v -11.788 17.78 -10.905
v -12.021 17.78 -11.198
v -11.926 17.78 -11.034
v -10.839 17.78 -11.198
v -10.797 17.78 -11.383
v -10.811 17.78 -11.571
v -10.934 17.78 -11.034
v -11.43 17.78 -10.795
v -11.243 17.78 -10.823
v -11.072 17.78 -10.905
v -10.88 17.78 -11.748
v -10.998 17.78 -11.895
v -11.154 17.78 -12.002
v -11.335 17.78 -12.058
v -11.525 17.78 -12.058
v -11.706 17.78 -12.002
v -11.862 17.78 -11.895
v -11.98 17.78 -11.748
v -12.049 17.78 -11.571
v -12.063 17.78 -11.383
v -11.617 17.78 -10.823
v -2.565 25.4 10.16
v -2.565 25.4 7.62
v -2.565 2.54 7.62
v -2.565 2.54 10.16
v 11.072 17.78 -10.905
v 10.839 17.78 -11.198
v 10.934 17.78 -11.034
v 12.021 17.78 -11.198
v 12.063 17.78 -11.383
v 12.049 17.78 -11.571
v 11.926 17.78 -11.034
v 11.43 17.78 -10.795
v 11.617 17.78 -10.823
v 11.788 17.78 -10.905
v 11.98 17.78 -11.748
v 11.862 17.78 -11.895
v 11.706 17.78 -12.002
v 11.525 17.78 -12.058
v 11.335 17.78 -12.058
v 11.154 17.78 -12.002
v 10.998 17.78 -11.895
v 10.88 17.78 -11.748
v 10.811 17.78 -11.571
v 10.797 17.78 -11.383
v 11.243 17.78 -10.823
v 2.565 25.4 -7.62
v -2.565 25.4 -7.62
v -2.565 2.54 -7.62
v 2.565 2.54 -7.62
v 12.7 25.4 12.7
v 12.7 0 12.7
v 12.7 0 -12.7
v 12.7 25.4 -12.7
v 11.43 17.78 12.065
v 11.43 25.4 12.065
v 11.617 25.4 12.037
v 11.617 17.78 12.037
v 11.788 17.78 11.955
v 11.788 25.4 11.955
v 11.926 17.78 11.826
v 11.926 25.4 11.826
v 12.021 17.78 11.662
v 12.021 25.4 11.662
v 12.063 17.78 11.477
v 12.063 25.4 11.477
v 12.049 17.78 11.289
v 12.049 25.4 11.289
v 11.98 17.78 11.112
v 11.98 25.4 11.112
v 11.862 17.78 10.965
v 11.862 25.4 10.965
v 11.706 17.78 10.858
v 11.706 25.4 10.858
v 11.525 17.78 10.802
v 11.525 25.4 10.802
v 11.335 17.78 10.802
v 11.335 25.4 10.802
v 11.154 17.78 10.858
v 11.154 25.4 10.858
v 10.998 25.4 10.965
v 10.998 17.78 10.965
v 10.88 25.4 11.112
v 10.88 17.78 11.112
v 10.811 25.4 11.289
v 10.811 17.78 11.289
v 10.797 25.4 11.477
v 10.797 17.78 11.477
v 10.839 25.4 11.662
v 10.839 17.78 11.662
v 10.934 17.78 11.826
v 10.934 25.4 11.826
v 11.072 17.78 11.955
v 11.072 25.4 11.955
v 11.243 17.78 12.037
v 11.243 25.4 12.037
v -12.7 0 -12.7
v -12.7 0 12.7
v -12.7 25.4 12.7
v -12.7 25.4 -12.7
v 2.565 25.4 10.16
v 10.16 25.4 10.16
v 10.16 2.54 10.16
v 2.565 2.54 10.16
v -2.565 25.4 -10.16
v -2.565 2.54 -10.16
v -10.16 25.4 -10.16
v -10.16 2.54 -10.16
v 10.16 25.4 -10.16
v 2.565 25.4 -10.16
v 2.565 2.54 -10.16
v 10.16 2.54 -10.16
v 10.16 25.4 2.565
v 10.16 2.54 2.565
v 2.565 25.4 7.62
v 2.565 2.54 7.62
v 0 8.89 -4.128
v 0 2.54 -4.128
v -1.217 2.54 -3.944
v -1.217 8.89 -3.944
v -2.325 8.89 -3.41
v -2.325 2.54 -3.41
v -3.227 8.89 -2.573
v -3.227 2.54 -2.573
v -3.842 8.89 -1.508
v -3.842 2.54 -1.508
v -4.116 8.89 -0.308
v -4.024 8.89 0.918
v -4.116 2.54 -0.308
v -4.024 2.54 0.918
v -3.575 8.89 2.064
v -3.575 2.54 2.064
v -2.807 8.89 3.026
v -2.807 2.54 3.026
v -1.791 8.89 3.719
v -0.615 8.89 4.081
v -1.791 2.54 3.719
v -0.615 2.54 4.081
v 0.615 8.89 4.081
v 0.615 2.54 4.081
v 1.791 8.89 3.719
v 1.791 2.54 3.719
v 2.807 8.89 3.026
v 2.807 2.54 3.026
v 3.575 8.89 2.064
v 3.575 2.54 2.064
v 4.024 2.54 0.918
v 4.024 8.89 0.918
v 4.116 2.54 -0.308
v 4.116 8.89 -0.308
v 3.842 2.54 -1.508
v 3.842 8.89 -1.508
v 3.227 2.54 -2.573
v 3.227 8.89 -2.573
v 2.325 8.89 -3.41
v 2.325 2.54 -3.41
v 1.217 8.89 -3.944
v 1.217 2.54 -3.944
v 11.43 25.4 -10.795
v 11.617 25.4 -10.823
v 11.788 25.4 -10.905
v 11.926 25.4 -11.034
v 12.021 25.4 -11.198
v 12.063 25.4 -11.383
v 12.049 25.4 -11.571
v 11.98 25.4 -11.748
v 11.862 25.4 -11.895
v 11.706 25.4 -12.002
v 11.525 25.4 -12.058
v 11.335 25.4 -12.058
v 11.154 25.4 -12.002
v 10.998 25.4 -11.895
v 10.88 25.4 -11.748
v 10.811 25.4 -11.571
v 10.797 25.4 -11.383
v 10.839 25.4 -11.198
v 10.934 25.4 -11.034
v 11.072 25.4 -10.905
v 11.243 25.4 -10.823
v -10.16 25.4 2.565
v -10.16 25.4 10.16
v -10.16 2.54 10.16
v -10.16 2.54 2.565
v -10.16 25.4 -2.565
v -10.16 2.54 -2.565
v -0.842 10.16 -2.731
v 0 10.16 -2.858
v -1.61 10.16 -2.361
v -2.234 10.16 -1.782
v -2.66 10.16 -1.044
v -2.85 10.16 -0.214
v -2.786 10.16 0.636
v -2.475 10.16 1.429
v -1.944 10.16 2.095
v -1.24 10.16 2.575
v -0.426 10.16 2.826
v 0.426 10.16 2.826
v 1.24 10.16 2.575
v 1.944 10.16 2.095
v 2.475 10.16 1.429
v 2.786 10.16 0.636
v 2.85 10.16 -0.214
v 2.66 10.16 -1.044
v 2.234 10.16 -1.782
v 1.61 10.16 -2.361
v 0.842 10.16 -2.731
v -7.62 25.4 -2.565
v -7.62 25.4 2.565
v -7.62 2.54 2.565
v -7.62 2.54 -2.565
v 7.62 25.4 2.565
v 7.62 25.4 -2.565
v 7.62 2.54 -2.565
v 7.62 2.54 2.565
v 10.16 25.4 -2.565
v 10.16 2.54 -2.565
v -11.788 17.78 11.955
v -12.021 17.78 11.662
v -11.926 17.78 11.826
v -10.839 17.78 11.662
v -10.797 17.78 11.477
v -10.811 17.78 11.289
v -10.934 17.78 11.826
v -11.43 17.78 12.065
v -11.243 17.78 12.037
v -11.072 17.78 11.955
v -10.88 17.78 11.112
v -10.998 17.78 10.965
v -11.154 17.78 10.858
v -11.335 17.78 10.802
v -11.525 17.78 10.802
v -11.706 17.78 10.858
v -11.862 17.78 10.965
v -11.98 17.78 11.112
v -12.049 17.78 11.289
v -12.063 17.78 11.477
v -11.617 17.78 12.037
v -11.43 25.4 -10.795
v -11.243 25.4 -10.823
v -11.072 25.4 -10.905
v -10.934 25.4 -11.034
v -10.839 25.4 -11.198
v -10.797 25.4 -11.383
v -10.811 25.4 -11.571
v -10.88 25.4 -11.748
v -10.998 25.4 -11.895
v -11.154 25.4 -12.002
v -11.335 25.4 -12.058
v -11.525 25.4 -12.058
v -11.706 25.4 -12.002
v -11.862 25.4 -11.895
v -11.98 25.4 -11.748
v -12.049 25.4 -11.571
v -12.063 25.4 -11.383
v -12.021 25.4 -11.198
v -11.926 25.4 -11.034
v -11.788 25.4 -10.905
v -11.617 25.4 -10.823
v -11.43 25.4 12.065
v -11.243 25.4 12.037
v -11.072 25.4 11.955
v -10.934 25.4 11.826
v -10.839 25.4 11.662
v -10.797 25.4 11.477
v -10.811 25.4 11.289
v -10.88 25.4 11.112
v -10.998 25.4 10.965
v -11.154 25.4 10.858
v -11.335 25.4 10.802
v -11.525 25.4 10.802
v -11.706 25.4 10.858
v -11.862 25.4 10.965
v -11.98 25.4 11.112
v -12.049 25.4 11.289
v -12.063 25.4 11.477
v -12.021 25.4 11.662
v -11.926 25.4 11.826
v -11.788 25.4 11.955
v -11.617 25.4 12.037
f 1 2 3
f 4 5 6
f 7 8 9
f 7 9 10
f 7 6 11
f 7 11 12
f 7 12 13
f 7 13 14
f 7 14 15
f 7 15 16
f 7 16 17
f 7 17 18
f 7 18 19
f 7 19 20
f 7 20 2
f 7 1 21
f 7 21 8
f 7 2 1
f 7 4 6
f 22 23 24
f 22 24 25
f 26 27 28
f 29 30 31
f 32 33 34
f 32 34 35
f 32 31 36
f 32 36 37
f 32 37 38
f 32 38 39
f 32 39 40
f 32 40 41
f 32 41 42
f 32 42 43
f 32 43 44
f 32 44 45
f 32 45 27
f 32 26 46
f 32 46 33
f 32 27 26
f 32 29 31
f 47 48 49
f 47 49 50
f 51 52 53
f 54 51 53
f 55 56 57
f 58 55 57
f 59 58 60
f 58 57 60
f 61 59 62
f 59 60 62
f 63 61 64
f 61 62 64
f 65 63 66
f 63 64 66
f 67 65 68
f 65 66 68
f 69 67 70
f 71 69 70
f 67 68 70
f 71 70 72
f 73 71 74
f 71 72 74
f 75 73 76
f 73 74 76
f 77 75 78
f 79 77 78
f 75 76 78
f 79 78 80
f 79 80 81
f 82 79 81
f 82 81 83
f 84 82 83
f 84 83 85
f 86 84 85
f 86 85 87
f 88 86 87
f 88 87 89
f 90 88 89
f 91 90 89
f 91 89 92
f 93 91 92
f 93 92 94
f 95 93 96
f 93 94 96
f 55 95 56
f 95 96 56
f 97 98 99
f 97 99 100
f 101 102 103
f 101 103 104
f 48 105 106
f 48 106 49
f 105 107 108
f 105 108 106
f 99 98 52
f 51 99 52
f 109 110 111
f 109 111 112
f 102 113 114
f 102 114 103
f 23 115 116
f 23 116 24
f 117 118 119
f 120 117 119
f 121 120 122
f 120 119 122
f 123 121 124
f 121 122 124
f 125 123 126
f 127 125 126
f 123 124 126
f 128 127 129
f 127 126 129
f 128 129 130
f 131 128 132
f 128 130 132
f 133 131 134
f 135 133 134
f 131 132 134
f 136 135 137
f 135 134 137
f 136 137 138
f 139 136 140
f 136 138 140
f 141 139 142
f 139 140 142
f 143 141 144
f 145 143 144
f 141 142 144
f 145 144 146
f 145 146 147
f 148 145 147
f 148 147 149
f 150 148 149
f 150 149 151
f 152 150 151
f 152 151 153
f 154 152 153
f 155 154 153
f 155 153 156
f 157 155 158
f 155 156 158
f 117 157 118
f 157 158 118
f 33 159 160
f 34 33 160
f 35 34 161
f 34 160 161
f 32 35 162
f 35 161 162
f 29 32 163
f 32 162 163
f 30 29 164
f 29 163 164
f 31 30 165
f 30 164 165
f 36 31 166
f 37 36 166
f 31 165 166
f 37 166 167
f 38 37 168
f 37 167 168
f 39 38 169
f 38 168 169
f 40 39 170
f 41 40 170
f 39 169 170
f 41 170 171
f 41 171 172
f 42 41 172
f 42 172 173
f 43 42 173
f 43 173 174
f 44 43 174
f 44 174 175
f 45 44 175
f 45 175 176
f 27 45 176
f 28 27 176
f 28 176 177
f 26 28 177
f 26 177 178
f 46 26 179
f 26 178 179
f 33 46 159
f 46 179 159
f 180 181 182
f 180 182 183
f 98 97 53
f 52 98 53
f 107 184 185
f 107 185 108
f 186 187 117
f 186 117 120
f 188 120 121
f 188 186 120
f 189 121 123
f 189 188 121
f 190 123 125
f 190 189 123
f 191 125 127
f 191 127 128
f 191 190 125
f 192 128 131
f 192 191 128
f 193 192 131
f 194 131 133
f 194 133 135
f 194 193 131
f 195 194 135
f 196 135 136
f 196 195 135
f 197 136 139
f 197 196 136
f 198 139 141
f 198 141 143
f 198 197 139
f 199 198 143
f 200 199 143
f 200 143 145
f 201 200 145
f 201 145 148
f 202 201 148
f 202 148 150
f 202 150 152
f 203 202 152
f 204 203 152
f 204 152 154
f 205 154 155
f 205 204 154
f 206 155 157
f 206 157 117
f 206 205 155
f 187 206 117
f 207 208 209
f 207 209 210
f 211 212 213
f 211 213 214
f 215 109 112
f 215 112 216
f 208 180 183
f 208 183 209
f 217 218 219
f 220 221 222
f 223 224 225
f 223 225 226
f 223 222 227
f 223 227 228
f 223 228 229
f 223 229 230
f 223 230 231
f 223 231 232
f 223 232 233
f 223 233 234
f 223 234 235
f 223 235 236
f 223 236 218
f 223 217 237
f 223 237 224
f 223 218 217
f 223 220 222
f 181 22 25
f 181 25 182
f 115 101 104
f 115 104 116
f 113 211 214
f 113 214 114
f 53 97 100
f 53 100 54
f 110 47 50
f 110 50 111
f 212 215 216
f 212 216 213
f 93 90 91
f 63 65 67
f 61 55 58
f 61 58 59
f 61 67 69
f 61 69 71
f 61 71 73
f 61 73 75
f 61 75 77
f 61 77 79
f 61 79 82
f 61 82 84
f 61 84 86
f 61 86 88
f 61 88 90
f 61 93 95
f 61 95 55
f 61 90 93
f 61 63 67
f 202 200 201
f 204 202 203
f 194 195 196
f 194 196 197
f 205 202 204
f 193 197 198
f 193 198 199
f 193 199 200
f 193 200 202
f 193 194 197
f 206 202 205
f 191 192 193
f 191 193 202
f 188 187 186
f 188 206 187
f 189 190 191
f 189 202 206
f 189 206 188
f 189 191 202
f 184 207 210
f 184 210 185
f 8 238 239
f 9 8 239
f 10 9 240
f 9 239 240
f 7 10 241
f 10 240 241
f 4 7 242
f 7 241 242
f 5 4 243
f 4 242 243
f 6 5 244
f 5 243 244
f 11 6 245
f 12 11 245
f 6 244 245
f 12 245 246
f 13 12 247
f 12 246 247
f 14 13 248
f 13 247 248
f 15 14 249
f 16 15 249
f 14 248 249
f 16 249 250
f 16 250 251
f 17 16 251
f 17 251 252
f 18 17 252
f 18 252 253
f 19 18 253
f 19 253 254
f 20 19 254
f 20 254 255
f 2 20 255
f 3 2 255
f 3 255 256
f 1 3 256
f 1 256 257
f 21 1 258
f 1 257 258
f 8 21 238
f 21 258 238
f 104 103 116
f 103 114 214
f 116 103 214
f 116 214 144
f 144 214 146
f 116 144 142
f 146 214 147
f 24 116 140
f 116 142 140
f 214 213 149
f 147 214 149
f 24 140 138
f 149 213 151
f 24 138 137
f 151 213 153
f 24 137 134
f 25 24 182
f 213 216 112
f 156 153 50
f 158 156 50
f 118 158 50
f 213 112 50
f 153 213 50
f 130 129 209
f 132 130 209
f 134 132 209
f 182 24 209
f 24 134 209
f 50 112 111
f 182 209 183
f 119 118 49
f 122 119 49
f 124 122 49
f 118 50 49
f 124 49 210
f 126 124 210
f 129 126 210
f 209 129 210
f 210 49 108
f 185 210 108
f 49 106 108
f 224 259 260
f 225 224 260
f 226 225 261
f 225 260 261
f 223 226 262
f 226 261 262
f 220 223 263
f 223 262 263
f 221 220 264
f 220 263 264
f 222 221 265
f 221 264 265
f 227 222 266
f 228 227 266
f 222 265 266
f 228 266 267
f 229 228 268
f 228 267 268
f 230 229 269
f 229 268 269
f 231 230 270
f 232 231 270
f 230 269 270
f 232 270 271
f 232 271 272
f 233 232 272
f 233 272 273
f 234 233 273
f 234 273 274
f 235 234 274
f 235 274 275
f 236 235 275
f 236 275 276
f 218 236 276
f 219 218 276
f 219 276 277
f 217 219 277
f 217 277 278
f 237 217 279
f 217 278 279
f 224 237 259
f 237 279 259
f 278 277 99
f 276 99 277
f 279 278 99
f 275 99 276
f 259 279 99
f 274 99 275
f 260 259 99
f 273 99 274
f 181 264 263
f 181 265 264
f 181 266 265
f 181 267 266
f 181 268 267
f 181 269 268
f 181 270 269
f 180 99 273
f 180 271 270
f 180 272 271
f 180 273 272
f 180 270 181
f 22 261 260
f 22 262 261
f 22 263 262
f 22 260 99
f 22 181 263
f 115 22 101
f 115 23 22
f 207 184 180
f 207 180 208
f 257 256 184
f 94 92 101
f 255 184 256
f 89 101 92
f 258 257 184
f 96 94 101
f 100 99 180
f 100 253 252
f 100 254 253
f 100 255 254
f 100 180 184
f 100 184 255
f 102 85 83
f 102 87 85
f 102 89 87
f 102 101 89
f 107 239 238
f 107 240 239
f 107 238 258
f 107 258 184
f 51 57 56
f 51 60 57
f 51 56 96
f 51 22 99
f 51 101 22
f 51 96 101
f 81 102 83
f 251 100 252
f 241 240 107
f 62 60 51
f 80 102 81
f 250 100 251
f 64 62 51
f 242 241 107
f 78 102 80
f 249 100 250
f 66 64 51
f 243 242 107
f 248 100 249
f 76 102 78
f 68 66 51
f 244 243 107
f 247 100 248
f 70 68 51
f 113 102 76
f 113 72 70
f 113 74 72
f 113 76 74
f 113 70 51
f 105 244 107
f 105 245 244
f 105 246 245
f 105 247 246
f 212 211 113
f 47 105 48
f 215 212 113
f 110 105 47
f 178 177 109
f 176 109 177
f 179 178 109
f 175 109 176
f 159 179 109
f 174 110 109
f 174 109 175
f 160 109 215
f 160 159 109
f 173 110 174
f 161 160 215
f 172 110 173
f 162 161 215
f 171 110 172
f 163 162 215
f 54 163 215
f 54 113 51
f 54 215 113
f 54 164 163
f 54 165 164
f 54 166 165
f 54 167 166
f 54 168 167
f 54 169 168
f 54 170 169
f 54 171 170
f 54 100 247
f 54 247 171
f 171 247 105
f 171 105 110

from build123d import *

# Parameters (mm, degrees)
SKETCH1_W           = 25.4
SKETCH1_H           = 25.4
BOSS_EXTRUDE1_DEPTH = 25.4
CUT_EXTRUDE2_DEPTH  = 22.86
SKETCH4_R           = 0.635
CUT_EXTRUDE4_DEPTH  = 7.62
SKETCH5_R           = 4.1275
BOSS_EXTRUDE2_DEPTH = 7.62
CHAMFER1_SIZE       = 1.27


with BuildPart() as part:
    # Sketch1 → Boss-Extrude1 (new body)
    with BuildSketch(Plane(origin=(0, 0, 0), x_dir=(1, 0, 0), z_dir=(0, 1, 0))):
        Rectangle(SKETCH1_W, SKETCH1_H)
    extrude(amount=BOSS_EXTRUDE1_DEPTH)

    # Sketch3 → Cut-Extrude2 (cut)
    with BuildSketch(Plane(origin=(0, 25.4, 0), x_dir=(1, 0, 0), z_dir=(0, 1, 0))):
        Polygon((10.16, 2.565122784), (7.62, 2.565122784), (7.62, -2.565122784), (10.16, -2.565122784), (10.16, -10.16), (2.565122784, -10.16), (2.565122784, -7.62), (-2.565122784, -7.62), (-2.565122784, -10.16), (-10.16, -10.16), (-10.16, -2.565122784), (-7.62, -2.565122784), (-7.62, 2.565122784), (-10.16, 2.565122784), (-10.16, 10.16), (-2.565122784, 10.16), (-2.565122784, 7.62), (2.565122784, 7.62), (2.565122784, 10.16), (10.16, 10.16), align=None)
    extrude(amount=-CUT_EXTRUDE2_DEPTH, mode=Mode.SUBTRACT)

    # Sketch4 → Cut-Extrude4 (cut)
    with BuildSketch(Plane(origin=(0, 25.4, 0), x_dir=(1, 0, 0), z_dir=(0, 1, 0))):
        with Locations(Location((11.43, 11.43, 0), (0, 0, 270))):
            Circle(SKETCH4_R)
        with Locations(Location((11.43, -11.43, 0), (0, 0, 270))):
            Circle(SKETCH4_R)
        with Locations(Location((-11.43, -11.43, 0), (0, 0, 270))):
            Circle(SKETCH4_R)
        with Locations(Location((-11.43, 11.43, 0), (0, 0, 270))):
            Circle(SKETCH4_R)
    extrude(amount=-CUT_EXTRUDE4_DEPTH, mode=Mode.SUBTRACT)

    # Sketch5 → Boss-Extrude2 (add)
    with BuildSketch(Plane(origin=(0, 2.54, 0), x_dir=(1, 0, 0), z_dir=(0, 1, 0))):
        with Locations(Location((0, 0, 0), (0, 0, 90))):
            Circle(SKETCH5_R)
    extrude(amount=BOSS_EXTRUDE2_DEPTH)

    # Chamfer1
    chamfer1_edges = [part.edges().sort_by_distance(p)[0] for p in [
        (0, 10.16, 4.1275),
    ]]
    chamfer(chamfer1_edges, length=CHAMFER1_SIZE)


solid = part.part
